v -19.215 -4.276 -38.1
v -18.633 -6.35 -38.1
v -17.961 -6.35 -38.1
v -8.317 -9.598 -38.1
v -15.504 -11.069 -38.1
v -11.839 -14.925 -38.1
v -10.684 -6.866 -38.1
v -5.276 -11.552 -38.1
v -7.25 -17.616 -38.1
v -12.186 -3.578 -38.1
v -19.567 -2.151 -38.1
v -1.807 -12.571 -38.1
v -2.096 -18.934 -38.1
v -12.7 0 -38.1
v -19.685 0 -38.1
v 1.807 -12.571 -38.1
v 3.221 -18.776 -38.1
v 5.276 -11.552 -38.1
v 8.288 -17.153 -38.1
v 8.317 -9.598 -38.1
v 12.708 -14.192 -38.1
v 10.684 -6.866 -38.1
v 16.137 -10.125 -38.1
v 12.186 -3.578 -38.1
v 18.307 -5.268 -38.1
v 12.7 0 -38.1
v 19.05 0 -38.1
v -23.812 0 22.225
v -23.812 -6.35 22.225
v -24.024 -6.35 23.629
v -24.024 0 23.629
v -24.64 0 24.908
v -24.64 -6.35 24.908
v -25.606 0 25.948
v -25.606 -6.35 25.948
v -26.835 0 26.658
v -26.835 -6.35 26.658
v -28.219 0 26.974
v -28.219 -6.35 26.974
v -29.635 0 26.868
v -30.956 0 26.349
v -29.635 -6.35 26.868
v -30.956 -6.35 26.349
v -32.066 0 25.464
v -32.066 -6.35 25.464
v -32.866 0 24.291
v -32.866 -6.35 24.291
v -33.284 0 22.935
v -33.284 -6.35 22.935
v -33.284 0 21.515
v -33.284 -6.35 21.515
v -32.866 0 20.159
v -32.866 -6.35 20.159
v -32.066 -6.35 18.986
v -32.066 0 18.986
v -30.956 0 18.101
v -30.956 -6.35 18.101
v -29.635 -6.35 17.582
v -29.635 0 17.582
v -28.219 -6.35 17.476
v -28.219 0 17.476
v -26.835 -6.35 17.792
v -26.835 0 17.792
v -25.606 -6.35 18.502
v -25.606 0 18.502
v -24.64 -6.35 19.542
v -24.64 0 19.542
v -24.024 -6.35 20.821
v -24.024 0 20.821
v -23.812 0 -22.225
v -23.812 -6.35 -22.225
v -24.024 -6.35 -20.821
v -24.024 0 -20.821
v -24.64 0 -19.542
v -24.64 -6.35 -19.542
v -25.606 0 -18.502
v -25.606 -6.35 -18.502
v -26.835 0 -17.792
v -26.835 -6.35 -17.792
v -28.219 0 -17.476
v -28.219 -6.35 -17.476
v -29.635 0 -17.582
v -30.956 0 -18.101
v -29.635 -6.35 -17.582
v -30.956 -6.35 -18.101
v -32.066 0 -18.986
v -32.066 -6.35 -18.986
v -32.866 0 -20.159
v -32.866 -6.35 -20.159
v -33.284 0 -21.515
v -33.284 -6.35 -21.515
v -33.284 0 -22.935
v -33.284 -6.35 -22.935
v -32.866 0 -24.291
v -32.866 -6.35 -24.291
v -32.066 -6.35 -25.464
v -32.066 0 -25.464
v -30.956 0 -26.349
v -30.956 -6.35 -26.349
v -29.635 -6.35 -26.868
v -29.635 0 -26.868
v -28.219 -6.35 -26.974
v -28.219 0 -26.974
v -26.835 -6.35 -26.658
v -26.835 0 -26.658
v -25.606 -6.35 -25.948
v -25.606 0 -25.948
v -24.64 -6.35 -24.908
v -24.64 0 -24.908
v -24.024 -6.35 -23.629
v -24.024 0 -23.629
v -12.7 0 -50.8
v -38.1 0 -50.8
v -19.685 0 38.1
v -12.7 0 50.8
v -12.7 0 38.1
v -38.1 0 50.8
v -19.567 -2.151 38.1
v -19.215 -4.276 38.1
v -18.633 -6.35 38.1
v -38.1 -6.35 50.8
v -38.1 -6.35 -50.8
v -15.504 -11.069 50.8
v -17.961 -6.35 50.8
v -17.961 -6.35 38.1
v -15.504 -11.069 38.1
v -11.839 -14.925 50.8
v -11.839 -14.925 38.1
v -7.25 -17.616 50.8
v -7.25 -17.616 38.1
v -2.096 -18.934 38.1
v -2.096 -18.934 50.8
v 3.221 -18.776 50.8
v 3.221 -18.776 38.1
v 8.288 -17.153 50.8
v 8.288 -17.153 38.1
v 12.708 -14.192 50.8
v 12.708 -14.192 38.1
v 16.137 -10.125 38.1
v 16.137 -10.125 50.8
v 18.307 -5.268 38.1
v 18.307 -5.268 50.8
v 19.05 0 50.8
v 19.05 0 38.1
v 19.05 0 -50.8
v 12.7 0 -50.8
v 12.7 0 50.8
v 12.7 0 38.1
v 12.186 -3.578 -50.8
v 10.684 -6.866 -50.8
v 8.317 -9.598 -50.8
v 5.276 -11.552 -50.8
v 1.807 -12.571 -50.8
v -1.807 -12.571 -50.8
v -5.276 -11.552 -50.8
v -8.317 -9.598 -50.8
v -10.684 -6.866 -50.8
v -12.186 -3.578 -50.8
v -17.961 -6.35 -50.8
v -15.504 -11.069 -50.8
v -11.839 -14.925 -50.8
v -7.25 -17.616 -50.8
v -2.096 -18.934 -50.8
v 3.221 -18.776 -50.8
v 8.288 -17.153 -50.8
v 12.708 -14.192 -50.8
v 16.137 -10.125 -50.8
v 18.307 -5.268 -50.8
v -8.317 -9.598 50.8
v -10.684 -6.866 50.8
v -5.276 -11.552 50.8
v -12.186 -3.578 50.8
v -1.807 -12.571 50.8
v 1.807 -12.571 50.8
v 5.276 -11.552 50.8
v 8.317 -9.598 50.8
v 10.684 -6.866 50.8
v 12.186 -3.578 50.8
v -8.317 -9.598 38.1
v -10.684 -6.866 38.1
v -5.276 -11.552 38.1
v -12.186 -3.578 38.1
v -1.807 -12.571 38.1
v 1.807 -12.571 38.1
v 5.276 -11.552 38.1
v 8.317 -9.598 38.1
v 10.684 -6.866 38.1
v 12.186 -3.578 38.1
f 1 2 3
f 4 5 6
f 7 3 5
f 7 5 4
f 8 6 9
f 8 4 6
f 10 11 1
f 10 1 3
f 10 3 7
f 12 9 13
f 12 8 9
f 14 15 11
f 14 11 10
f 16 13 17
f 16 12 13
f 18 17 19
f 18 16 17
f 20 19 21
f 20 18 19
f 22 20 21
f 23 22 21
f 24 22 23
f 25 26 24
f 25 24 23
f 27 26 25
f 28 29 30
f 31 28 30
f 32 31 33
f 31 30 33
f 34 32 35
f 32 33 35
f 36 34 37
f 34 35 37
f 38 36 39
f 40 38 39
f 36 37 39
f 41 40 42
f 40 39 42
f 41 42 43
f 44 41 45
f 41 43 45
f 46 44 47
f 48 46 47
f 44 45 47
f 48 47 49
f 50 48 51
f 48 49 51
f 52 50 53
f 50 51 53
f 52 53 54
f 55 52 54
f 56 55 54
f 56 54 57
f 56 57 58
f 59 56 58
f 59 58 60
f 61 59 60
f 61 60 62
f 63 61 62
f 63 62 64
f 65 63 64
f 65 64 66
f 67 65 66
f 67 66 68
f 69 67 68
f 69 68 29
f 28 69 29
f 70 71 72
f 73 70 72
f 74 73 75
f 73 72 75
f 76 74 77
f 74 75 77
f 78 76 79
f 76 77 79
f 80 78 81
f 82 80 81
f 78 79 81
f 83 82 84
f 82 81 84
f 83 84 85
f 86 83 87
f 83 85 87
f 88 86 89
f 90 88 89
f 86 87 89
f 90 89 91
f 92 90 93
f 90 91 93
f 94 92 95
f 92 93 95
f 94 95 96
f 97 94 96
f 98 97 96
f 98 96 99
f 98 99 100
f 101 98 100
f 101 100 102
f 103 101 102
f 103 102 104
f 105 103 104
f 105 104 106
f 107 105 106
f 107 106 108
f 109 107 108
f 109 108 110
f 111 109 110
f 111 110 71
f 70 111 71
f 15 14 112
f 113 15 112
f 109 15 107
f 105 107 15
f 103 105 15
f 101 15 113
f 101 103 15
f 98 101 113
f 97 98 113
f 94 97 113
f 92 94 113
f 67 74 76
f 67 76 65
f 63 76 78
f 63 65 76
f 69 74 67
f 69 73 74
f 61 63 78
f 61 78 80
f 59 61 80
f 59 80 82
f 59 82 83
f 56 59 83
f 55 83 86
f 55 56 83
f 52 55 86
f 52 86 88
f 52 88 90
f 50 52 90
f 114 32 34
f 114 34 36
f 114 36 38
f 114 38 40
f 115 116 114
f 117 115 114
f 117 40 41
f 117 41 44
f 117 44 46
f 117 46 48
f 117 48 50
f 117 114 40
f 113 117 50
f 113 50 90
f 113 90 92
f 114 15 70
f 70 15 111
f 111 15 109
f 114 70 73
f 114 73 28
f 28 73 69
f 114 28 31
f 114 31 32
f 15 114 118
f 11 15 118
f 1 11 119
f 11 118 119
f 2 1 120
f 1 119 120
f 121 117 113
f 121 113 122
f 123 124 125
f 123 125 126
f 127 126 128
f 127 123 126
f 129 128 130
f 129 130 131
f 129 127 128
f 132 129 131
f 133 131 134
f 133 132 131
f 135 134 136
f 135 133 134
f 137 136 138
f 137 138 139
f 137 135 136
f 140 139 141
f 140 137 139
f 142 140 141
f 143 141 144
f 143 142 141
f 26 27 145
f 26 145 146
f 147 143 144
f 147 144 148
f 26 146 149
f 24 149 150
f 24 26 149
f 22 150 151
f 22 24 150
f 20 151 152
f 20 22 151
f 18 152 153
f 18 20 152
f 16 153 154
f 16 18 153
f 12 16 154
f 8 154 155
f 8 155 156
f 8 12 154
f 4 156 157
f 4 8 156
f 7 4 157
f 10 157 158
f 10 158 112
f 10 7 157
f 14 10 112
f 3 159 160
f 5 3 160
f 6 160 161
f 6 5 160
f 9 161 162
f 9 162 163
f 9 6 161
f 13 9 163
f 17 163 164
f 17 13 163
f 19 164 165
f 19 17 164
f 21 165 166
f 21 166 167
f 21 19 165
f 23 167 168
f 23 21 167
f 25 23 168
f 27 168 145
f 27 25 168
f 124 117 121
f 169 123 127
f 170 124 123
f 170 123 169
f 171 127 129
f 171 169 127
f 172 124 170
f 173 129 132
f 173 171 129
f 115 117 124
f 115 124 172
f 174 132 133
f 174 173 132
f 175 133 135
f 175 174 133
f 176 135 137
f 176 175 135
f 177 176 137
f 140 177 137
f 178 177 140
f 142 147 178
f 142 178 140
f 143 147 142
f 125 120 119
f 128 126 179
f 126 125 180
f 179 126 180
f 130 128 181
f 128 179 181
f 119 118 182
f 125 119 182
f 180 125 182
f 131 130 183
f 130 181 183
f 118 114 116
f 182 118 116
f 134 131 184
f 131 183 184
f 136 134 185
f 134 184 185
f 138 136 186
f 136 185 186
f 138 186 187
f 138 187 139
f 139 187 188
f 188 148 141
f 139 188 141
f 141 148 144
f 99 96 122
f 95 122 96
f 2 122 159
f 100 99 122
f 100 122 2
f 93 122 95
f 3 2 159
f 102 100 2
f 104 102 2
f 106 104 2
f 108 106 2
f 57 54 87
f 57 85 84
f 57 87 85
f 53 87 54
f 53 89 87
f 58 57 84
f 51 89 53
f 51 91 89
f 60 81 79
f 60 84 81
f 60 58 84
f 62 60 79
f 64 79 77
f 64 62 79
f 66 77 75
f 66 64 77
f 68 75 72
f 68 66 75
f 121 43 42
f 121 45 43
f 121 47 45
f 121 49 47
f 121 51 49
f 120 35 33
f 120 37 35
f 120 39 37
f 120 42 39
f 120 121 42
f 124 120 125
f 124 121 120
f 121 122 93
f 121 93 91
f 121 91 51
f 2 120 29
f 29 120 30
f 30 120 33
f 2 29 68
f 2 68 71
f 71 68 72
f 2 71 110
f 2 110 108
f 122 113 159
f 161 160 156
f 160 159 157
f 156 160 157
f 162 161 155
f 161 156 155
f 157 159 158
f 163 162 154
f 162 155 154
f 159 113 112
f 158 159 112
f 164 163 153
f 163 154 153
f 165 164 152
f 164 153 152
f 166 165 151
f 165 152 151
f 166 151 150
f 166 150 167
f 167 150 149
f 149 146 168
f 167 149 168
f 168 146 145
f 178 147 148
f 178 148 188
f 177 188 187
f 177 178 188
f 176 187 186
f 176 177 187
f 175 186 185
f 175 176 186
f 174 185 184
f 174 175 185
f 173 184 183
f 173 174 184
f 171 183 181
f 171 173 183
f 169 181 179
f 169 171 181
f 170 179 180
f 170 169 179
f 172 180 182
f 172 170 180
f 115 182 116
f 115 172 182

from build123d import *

# Parameters (mm, degrees)
F1_DEPTH = 50.8
F2_R     = 19.685
F3_DEPTH = 38.1
F4_R     = 4.7625
F5_DEPTH = 12.7


with BuildPart() as f1:
    # F0 (on Top) → F1 (new body, symmetric)
    with BuildSketch(Plane.XY):
        with BuildLine():
            Line((-12.7, 0), (-38.1, 0))
            Line((-38.1, 0), (-38.1, -6.35))
            Line((-38.1, -6.35), (-17.960512, -6.35))
            ThreePointArc((-17.960512, -6.35), (3.221393, -18.775653), (19.05, 0))
            Line((19.05, 0), (12.7, 0))
            ThreePointArc((12.7, 0), (0, -12.7), (-12.7, 0))
        make_face()
    extrude(amount=F1_DEPTH, both=True)

    # F2 (on Top) → F3 (cut, symmetric)
    with BuildSketch(Plane.XY):
        Circle(F2_R)
    extrude(amount=F3_DEPTH, both=True, mode=Mode.SUBTRACT)

    # F4 (on face) → F5 (cut)
    with BuildSketch(Plane.XZ.offset(6.35)):
        with Locations((-28.575, 22.225)):
            Circle(F4_R)
        with Locations((-28.575, -22.225)):
            Circle(F4_R)
    extrude(amount=-F5_DEPTH, mode=Mode.SUBTRACT)


solid = f1.part
